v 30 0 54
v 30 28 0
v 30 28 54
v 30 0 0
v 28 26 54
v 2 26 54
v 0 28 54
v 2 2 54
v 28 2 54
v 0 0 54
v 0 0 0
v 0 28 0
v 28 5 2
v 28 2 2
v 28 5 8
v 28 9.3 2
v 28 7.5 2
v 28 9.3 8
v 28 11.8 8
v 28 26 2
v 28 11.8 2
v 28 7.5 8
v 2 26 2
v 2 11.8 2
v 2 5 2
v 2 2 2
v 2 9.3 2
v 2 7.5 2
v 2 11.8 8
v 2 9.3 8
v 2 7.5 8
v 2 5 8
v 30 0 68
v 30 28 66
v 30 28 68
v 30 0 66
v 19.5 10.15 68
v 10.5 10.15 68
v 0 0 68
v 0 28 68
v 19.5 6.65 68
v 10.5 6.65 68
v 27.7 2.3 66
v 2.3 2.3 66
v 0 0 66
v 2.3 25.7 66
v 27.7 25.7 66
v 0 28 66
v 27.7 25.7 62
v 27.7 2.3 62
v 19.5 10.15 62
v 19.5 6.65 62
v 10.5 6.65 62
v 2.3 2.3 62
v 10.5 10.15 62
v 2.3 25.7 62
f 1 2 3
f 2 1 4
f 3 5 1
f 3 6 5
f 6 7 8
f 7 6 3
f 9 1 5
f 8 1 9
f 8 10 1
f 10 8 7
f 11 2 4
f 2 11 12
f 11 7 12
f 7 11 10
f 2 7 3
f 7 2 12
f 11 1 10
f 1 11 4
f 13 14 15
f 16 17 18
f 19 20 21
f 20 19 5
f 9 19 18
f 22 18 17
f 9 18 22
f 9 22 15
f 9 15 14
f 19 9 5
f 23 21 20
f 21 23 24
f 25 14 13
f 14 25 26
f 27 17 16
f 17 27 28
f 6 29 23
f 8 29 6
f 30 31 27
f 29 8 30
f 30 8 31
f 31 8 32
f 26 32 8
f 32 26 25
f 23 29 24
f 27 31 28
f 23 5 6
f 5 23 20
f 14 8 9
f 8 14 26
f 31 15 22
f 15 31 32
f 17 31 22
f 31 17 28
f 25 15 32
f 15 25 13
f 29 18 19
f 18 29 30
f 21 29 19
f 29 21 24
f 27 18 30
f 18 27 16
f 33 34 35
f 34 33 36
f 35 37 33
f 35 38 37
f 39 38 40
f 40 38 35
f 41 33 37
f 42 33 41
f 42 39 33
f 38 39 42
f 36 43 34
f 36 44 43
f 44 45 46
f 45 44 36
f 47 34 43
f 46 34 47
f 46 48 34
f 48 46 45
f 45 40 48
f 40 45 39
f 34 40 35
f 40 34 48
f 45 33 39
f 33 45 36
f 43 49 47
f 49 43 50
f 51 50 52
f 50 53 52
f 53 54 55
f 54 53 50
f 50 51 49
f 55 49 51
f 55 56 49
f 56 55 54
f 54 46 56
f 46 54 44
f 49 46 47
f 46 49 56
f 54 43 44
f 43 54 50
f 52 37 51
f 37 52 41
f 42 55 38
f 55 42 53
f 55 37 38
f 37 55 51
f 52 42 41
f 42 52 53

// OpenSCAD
// NodeMCU ESP8266 ESP-12F (USB-C) Enclosure
// Single box; board inserts vertically from top (USB-C up); cap closes top.

/* [Internal Cavity] */
inner_x = 26;   // width (matches PCB width)
inner_y = 24;   // depth
inner_z = 52;   // main height (PCB height); USB-C adds 2mm into cap

/* [Board] */
pcb_thick    = 1.5;
component_h  = 3;    // tallest component above PCB face (reference)

/* [USB-C Port] */
usbc_w = 9;
usbc_h = 3.5;

/* [Case] */
wall      = 2;
cap_lip   = 4;     // cap lip insertion depth into box
cap_clear = 0.3;   // cap-to-box lateral clearance

/* [Slide Rails] */
rail_h      = 6;
rail_w      = 2.5;
rail_gap    = pcb_thick + 0.3;  // groove width (PCB + clearance)
rail_offset = 3;                 // gap between back wall and first rail

/* [Computed PCB position] */
pcb_y = wall + rail_offset + rail_w + rail_gap / 2;  // PCB centerline Y

/* [Computed] */
outer_x = inner_x + wall * 2;
outer_y = inner_y + wall * 2;
outer_z = inner_z + wall;    // bottom wall only; top is open for cap

/* [Rendering] */
part    = "both";   // [box, cap, both]
explode = 12;

module box() {
    difference() {
        cube([outer_x, outer_y, outer_z]);

        // Main cavity (open top)
        translate([wall, wall, wall])
            cube([inner_x, inner_y, inner_z + 1]);
    }

    // Two parallel rails at bottom form the PCB slide groove
    // Offset `rail_offset` from the back wall (Y=0 side)
    y1 = wall + rail_offset;
    y2 = y1 + rail_w + rail_gap;
    for (y = [y1, y2])
        translate([wall, y, wall])
            cube([inner_x, rail_w, rail_h]);
}

module cap() {
    difference() {
        union() {
            // Top plate
            cube([outer_x, outer_y, wall]);

            // Lip that slides into the box opening
            translate([wall + cap_clear, wall + cap_clear, -cap_lip])
                cube([
                    inner_x - cap_clear * 2,
                    inner_y - cap_clear * 2,
                    cap_lip
                ]);
        }

        // USB-C cutout: through top plate AND lip (full cap depth)
        translate([
            outer_x / 2 - usbc_w / 2,
            pcb_y - usbc_h / 2,
            -cap_lip - 0.1
        ])
            cube([usbc_w, usbc_h, cap_lip + wall + 0.2]);
    }
}

if (part == "box" || part == "both")
    box();

if (part == "cap" || part == "both")
    translate([0, 0, outer_z + explode])
        cap();
